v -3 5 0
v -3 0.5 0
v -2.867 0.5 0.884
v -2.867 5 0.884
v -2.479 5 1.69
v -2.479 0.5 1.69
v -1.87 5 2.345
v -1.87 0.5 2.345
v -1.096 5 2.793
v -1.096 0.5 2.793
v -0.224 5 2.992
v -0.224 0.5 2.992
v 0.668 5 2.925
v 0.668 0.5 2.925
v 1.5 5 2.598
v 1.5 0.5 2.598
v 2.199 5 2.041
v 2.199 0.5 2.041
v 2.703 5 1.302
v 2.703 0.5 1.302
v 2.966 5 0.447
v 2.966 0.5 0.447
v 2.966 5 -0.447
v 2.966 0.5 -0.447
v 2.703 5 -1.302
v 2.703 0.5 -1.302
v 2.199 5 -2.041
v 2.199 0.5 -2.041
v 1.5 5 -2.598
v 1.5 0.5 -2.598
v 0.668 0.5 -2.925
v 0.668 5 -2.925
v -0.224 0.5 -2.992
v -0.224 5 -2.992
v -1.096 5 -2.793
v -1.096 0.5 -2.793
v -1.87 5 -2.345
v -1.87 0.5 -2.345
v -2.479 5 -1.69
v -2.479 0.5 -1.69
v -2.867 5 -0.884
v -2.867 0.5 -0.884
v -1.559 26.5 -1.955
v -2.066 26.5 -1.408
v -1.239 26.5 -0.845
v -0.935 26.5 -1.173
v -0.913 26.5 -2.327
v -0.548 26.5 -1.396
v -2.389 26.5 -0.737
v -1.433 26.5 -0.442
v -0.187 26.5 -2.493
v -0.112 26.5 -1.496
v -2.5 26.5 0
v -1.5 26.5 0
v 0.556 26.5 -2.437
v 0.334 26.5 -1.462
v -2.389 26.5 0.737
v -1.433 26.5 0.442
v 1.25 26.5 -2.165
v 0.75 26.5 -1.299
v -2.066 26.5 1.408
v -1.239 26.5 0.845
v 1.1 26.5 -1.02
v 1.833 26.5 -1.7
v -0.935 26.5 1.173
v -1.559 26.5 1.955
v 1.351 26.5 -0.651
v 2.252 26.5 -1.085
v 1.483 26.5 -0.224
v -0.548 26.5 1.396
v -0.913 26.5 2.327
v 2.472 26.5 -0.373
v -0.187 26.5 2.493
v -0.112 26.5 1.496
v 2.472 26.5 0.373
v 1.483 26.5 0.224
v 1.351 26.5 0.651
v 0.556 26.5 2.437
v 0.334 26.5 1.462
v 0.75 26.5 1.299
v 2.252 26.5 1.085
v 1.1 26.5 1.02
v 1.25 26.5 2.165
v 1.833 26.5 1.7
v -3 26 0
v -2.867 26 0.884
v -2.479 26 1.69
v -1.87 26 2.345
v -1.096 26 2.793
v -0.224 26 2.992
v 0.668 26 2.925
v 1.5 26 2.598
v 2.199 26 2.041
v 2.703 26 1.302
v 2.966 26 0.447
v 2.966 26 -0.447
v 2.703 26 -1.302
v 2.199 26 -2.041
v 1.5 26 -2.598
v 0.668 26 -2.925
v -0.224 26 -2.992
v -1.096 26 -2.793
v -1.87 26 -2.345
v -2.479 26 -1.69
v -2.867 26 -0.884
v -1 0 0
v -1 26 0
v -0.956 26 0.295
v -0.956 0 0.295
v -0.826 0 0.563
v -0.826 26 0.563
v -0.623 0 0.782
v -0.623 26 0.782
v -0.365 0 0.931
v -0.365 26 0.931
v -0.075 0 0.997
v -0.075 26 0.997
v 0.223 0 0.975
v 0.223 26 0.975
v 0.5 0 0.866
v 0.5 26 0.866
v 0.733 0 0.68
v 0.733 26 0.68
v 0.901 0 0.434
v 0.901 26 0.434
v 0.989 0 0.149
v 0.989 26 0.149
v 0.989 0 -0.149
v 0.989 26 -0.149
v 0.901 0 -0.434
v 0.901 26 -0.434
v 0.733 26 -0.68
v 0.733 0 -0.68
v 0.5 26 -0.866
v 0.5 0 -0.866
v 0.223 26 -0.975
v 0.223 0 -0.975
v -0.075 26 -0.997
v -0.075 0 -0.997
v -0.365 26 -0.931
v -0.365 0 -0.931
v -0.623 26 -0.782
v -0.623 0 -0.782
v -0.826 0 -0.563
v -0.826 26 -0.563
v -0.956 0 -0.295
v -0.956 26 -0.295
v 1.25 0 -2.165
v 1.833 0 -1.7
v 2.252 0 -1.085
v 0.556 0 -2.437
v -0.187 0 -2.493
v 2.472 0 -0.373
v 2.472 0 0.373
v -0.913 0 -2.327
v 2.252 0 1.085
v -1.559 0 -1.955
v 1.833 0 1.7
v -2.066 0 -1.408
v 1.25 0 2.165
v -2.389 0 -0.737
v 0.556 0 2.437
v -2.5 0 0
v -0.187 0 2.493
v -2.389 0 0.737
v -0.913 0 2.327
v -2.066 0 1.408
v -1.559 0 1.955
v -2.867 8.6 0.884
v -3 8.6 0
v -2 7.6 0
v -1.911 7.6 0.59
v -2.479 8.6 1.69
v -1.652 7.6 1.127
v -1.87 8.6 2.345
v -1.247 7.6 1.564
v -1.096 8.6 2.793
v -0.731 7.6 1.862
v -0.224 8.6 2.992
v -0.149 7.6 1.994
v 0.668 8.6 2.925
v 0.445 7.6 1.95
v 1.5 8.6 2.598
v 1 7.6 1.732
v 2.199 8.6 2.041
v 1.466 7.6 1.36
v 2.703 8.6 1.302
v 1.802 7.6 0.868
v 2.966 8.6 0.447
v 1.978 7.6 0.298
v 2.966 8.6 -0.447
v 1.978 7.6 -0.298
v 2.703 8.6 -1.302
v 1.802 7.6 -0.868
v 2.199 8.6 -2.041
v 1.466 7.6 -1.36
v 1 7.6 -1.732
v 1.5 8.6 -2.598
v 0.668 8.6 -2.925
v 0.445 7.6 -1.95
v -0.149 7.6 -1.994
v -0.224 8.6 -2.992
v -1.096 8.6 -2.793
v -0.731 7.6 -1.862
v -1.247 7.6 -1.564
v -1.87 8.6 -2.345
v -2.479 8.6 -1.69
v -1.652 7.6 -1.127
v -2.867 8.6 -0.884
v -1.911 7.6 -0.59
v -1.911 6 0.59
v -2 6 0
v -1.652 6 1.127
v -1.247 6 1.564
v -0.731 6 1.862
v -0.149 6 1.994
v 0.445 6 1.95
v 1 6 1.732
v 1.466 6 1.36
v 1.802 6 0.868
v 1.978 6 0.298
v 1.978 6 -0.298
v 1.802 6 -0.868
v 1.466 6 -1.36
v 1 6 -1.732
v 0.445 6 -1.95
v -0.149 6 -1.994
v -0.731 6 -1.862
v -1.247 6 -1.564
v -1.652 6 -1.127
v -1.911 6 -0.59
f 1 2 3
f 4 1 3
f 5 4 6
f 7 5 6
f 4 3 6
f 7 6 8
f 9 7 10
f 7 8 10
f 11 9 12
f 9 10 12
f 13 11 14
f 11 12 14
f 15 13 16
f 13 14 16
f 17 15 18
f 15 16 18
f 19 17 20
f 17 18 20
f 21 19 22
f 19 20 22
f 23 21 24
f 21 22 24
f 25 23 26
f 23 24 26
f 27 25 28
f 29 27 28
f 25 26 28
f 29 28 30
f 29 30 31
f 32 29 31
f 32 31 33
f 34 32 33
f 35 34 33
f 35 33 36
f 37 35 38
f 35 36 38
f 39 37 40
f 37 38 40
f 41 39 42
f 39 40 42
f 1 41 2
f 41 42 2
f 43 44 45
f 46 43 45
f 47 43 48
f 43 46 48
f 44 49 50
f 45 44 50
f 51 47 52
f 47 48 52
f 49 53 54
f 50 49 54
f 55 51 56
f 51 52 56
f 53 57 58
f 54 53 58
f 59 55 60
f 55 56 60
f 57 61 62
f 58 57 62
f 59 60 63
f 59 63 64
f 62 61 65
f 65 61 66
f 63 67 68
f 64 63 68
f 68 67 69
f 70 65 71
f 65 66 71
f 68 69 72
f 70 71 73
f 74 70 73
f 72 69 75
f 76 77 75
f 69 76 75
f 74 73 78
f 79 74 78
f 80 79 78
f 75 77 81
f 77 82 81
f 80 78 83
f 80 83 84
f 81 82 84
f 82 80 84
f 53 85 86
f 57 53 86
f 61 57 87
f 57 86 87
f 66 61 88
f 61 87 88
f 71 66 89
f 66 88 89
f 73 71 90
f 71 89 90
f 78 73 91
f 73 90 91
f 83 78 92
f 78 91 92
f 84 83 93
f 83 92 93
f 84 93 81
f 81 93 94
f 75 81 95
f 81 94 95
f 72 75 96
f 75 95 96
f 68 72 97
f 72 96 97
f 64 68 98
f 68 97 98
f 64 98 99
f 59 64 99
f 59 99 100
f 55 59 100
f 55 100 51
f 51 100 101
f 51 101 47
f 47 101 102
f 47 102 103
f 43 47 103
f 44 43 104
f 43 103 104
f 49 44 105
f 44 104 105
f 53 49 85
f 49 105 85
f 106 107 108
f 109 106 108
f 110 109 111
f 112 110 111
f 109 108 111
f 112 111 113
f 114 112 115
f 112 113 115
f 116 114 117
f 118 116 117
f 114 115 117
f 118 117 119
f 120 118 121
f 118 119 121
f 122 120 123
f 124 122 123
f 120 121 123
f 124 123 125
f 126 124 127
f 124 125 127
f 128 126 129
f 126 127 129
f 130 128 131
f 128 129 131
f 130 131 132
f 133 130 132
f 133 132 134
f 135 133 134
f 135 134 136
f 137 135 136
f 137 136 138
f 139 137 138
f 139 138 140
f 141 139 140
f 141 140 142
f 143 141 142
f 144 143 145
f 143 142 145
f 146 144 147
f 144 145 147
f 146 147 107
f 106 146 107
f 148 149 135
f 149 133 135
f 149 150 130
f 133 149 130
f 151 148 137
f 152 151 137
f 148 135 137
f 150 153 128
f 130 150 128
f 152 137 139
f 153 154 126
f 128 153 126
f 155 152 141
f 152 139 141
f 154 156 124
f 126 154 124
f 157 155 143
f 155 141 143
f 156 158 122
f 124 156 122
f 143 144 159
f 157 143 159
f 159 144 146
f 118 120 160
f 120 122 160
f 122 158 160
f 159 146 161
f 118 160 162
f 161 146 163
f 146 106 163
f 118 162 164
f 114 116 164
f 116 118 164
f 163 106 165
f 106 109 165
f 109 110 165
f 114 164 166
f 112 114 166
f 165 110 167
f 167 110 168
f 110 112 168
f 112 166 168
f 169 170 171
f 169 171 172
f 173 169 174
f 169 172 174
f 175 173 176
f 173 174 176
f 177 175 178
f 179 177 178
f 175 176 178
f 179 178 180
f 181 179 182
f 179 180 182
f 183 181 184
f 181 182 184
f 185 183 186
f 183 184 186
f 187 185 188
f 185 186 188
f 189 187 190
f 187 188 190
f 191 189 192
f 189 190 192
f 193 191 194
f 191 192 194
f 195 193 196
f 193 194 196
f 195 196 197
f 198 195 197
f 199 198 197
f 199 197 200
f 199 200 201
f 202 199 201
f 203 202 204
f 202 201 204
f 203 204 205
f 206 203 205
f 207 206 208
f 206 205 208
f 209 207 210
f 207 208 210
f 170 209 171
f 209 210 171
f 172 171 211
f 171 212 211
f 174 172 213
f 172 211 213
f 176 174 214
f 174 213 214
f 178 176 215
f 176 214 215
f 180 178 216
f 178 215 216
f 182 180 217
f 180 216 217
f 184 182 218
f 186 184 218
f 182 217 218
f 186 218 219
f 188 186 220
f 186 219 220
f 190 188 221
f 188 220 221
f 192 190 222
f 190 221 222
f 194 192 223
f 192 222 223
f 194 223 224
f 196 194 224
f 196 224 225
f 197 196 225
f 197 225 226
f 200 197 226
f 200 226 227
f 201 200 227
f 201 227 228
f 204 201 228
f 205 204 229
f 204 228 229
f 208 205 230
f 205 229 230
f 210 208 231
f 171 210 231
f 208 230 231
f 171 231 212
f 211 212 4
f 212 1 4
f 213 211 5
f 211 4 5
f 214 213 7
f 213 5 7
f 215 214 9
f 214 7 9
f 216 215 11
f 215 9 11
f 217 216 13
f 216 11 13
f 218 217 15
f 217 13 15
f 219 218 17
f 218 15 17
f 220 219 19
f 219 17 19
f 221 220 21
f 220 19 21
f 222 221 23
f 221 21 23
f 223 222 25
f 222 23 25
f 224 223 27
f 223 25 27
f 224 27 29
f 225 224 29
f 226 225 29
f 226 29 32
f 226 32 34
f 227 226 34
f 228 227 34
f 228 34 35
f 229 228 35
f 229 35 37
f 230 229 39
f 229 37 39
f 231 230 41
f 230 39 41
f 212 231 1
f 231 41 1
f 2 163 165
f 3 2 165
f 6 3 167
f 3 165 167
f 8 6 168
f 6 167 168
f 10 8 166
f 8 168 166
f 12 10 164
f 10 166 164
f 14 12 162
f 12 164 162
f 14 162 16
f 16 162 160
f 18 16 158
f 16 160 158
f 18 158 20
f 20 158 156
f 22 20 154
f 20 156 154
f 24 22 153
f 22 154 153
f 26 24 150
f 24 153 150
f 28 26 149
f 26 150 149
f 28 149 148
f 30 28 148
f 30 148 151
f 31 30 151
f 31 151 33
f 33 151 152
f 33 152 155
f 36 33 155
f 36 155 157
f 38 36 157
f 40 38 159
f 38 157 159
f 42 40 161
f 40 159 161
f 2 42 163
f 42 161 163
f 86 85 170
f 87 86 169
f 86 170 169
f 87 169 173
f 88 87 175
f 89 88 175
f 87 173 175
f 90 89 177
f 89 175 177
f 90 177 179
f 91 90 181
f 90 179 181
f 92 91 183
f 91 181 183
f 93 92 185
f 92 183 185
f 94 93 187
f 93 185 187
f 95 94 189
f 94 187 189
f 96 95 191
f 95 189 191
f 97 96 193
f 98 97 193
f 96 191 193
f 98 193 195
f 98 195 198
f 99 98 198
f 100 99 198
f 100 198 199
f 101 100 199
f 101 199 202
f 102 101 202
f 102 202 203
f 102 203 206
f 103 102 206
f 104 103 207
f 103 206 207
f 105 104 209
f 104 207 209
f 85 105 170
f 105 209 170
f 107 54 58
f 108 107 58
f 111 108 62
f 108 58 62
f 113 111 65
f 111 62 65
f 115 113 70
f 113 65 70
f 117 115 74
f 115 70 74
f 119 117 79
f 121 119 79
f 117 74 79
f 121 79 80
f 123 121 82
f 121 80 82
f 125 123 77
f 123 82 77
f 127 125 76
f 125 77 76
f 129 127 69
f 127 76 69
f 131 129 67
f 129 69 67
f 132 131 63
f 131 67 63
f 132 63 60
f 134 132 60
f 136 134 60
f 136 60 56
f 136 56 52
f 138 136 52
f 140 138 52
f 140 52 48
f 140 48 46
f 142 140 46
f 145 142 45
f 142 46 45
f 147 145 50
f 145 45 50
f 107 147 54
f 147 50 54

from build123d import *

# Parameters (mm, degrees)
CHAMFER2_SIZE = 0.5


with BuildPart() as part:
    # Sketch4 → Revolve1 (revolve)
    with BuildSketch(Plane.XY):
        Polygon((-1, 0), (-1, 26.5), (-3, 26.5), (-3, 8.6), (-2, 7.6), (-2, 6), (-3, 5), (-3, 0), align=None)
    revolve(axis=Axis((0, -1000, 0), (0, 1, 0)))

    # Chamfer2
    chamfer2_edges = [part.edges().sort_by_distance(p)[0] for p in [
        (3, 0, 0),
        (3, 26.5, 0),
        (1, 26.5, 0),
    ]]
    chamfer(chamfer2_edges, length=CHAMFER2_SIZE)


solid = part.part
